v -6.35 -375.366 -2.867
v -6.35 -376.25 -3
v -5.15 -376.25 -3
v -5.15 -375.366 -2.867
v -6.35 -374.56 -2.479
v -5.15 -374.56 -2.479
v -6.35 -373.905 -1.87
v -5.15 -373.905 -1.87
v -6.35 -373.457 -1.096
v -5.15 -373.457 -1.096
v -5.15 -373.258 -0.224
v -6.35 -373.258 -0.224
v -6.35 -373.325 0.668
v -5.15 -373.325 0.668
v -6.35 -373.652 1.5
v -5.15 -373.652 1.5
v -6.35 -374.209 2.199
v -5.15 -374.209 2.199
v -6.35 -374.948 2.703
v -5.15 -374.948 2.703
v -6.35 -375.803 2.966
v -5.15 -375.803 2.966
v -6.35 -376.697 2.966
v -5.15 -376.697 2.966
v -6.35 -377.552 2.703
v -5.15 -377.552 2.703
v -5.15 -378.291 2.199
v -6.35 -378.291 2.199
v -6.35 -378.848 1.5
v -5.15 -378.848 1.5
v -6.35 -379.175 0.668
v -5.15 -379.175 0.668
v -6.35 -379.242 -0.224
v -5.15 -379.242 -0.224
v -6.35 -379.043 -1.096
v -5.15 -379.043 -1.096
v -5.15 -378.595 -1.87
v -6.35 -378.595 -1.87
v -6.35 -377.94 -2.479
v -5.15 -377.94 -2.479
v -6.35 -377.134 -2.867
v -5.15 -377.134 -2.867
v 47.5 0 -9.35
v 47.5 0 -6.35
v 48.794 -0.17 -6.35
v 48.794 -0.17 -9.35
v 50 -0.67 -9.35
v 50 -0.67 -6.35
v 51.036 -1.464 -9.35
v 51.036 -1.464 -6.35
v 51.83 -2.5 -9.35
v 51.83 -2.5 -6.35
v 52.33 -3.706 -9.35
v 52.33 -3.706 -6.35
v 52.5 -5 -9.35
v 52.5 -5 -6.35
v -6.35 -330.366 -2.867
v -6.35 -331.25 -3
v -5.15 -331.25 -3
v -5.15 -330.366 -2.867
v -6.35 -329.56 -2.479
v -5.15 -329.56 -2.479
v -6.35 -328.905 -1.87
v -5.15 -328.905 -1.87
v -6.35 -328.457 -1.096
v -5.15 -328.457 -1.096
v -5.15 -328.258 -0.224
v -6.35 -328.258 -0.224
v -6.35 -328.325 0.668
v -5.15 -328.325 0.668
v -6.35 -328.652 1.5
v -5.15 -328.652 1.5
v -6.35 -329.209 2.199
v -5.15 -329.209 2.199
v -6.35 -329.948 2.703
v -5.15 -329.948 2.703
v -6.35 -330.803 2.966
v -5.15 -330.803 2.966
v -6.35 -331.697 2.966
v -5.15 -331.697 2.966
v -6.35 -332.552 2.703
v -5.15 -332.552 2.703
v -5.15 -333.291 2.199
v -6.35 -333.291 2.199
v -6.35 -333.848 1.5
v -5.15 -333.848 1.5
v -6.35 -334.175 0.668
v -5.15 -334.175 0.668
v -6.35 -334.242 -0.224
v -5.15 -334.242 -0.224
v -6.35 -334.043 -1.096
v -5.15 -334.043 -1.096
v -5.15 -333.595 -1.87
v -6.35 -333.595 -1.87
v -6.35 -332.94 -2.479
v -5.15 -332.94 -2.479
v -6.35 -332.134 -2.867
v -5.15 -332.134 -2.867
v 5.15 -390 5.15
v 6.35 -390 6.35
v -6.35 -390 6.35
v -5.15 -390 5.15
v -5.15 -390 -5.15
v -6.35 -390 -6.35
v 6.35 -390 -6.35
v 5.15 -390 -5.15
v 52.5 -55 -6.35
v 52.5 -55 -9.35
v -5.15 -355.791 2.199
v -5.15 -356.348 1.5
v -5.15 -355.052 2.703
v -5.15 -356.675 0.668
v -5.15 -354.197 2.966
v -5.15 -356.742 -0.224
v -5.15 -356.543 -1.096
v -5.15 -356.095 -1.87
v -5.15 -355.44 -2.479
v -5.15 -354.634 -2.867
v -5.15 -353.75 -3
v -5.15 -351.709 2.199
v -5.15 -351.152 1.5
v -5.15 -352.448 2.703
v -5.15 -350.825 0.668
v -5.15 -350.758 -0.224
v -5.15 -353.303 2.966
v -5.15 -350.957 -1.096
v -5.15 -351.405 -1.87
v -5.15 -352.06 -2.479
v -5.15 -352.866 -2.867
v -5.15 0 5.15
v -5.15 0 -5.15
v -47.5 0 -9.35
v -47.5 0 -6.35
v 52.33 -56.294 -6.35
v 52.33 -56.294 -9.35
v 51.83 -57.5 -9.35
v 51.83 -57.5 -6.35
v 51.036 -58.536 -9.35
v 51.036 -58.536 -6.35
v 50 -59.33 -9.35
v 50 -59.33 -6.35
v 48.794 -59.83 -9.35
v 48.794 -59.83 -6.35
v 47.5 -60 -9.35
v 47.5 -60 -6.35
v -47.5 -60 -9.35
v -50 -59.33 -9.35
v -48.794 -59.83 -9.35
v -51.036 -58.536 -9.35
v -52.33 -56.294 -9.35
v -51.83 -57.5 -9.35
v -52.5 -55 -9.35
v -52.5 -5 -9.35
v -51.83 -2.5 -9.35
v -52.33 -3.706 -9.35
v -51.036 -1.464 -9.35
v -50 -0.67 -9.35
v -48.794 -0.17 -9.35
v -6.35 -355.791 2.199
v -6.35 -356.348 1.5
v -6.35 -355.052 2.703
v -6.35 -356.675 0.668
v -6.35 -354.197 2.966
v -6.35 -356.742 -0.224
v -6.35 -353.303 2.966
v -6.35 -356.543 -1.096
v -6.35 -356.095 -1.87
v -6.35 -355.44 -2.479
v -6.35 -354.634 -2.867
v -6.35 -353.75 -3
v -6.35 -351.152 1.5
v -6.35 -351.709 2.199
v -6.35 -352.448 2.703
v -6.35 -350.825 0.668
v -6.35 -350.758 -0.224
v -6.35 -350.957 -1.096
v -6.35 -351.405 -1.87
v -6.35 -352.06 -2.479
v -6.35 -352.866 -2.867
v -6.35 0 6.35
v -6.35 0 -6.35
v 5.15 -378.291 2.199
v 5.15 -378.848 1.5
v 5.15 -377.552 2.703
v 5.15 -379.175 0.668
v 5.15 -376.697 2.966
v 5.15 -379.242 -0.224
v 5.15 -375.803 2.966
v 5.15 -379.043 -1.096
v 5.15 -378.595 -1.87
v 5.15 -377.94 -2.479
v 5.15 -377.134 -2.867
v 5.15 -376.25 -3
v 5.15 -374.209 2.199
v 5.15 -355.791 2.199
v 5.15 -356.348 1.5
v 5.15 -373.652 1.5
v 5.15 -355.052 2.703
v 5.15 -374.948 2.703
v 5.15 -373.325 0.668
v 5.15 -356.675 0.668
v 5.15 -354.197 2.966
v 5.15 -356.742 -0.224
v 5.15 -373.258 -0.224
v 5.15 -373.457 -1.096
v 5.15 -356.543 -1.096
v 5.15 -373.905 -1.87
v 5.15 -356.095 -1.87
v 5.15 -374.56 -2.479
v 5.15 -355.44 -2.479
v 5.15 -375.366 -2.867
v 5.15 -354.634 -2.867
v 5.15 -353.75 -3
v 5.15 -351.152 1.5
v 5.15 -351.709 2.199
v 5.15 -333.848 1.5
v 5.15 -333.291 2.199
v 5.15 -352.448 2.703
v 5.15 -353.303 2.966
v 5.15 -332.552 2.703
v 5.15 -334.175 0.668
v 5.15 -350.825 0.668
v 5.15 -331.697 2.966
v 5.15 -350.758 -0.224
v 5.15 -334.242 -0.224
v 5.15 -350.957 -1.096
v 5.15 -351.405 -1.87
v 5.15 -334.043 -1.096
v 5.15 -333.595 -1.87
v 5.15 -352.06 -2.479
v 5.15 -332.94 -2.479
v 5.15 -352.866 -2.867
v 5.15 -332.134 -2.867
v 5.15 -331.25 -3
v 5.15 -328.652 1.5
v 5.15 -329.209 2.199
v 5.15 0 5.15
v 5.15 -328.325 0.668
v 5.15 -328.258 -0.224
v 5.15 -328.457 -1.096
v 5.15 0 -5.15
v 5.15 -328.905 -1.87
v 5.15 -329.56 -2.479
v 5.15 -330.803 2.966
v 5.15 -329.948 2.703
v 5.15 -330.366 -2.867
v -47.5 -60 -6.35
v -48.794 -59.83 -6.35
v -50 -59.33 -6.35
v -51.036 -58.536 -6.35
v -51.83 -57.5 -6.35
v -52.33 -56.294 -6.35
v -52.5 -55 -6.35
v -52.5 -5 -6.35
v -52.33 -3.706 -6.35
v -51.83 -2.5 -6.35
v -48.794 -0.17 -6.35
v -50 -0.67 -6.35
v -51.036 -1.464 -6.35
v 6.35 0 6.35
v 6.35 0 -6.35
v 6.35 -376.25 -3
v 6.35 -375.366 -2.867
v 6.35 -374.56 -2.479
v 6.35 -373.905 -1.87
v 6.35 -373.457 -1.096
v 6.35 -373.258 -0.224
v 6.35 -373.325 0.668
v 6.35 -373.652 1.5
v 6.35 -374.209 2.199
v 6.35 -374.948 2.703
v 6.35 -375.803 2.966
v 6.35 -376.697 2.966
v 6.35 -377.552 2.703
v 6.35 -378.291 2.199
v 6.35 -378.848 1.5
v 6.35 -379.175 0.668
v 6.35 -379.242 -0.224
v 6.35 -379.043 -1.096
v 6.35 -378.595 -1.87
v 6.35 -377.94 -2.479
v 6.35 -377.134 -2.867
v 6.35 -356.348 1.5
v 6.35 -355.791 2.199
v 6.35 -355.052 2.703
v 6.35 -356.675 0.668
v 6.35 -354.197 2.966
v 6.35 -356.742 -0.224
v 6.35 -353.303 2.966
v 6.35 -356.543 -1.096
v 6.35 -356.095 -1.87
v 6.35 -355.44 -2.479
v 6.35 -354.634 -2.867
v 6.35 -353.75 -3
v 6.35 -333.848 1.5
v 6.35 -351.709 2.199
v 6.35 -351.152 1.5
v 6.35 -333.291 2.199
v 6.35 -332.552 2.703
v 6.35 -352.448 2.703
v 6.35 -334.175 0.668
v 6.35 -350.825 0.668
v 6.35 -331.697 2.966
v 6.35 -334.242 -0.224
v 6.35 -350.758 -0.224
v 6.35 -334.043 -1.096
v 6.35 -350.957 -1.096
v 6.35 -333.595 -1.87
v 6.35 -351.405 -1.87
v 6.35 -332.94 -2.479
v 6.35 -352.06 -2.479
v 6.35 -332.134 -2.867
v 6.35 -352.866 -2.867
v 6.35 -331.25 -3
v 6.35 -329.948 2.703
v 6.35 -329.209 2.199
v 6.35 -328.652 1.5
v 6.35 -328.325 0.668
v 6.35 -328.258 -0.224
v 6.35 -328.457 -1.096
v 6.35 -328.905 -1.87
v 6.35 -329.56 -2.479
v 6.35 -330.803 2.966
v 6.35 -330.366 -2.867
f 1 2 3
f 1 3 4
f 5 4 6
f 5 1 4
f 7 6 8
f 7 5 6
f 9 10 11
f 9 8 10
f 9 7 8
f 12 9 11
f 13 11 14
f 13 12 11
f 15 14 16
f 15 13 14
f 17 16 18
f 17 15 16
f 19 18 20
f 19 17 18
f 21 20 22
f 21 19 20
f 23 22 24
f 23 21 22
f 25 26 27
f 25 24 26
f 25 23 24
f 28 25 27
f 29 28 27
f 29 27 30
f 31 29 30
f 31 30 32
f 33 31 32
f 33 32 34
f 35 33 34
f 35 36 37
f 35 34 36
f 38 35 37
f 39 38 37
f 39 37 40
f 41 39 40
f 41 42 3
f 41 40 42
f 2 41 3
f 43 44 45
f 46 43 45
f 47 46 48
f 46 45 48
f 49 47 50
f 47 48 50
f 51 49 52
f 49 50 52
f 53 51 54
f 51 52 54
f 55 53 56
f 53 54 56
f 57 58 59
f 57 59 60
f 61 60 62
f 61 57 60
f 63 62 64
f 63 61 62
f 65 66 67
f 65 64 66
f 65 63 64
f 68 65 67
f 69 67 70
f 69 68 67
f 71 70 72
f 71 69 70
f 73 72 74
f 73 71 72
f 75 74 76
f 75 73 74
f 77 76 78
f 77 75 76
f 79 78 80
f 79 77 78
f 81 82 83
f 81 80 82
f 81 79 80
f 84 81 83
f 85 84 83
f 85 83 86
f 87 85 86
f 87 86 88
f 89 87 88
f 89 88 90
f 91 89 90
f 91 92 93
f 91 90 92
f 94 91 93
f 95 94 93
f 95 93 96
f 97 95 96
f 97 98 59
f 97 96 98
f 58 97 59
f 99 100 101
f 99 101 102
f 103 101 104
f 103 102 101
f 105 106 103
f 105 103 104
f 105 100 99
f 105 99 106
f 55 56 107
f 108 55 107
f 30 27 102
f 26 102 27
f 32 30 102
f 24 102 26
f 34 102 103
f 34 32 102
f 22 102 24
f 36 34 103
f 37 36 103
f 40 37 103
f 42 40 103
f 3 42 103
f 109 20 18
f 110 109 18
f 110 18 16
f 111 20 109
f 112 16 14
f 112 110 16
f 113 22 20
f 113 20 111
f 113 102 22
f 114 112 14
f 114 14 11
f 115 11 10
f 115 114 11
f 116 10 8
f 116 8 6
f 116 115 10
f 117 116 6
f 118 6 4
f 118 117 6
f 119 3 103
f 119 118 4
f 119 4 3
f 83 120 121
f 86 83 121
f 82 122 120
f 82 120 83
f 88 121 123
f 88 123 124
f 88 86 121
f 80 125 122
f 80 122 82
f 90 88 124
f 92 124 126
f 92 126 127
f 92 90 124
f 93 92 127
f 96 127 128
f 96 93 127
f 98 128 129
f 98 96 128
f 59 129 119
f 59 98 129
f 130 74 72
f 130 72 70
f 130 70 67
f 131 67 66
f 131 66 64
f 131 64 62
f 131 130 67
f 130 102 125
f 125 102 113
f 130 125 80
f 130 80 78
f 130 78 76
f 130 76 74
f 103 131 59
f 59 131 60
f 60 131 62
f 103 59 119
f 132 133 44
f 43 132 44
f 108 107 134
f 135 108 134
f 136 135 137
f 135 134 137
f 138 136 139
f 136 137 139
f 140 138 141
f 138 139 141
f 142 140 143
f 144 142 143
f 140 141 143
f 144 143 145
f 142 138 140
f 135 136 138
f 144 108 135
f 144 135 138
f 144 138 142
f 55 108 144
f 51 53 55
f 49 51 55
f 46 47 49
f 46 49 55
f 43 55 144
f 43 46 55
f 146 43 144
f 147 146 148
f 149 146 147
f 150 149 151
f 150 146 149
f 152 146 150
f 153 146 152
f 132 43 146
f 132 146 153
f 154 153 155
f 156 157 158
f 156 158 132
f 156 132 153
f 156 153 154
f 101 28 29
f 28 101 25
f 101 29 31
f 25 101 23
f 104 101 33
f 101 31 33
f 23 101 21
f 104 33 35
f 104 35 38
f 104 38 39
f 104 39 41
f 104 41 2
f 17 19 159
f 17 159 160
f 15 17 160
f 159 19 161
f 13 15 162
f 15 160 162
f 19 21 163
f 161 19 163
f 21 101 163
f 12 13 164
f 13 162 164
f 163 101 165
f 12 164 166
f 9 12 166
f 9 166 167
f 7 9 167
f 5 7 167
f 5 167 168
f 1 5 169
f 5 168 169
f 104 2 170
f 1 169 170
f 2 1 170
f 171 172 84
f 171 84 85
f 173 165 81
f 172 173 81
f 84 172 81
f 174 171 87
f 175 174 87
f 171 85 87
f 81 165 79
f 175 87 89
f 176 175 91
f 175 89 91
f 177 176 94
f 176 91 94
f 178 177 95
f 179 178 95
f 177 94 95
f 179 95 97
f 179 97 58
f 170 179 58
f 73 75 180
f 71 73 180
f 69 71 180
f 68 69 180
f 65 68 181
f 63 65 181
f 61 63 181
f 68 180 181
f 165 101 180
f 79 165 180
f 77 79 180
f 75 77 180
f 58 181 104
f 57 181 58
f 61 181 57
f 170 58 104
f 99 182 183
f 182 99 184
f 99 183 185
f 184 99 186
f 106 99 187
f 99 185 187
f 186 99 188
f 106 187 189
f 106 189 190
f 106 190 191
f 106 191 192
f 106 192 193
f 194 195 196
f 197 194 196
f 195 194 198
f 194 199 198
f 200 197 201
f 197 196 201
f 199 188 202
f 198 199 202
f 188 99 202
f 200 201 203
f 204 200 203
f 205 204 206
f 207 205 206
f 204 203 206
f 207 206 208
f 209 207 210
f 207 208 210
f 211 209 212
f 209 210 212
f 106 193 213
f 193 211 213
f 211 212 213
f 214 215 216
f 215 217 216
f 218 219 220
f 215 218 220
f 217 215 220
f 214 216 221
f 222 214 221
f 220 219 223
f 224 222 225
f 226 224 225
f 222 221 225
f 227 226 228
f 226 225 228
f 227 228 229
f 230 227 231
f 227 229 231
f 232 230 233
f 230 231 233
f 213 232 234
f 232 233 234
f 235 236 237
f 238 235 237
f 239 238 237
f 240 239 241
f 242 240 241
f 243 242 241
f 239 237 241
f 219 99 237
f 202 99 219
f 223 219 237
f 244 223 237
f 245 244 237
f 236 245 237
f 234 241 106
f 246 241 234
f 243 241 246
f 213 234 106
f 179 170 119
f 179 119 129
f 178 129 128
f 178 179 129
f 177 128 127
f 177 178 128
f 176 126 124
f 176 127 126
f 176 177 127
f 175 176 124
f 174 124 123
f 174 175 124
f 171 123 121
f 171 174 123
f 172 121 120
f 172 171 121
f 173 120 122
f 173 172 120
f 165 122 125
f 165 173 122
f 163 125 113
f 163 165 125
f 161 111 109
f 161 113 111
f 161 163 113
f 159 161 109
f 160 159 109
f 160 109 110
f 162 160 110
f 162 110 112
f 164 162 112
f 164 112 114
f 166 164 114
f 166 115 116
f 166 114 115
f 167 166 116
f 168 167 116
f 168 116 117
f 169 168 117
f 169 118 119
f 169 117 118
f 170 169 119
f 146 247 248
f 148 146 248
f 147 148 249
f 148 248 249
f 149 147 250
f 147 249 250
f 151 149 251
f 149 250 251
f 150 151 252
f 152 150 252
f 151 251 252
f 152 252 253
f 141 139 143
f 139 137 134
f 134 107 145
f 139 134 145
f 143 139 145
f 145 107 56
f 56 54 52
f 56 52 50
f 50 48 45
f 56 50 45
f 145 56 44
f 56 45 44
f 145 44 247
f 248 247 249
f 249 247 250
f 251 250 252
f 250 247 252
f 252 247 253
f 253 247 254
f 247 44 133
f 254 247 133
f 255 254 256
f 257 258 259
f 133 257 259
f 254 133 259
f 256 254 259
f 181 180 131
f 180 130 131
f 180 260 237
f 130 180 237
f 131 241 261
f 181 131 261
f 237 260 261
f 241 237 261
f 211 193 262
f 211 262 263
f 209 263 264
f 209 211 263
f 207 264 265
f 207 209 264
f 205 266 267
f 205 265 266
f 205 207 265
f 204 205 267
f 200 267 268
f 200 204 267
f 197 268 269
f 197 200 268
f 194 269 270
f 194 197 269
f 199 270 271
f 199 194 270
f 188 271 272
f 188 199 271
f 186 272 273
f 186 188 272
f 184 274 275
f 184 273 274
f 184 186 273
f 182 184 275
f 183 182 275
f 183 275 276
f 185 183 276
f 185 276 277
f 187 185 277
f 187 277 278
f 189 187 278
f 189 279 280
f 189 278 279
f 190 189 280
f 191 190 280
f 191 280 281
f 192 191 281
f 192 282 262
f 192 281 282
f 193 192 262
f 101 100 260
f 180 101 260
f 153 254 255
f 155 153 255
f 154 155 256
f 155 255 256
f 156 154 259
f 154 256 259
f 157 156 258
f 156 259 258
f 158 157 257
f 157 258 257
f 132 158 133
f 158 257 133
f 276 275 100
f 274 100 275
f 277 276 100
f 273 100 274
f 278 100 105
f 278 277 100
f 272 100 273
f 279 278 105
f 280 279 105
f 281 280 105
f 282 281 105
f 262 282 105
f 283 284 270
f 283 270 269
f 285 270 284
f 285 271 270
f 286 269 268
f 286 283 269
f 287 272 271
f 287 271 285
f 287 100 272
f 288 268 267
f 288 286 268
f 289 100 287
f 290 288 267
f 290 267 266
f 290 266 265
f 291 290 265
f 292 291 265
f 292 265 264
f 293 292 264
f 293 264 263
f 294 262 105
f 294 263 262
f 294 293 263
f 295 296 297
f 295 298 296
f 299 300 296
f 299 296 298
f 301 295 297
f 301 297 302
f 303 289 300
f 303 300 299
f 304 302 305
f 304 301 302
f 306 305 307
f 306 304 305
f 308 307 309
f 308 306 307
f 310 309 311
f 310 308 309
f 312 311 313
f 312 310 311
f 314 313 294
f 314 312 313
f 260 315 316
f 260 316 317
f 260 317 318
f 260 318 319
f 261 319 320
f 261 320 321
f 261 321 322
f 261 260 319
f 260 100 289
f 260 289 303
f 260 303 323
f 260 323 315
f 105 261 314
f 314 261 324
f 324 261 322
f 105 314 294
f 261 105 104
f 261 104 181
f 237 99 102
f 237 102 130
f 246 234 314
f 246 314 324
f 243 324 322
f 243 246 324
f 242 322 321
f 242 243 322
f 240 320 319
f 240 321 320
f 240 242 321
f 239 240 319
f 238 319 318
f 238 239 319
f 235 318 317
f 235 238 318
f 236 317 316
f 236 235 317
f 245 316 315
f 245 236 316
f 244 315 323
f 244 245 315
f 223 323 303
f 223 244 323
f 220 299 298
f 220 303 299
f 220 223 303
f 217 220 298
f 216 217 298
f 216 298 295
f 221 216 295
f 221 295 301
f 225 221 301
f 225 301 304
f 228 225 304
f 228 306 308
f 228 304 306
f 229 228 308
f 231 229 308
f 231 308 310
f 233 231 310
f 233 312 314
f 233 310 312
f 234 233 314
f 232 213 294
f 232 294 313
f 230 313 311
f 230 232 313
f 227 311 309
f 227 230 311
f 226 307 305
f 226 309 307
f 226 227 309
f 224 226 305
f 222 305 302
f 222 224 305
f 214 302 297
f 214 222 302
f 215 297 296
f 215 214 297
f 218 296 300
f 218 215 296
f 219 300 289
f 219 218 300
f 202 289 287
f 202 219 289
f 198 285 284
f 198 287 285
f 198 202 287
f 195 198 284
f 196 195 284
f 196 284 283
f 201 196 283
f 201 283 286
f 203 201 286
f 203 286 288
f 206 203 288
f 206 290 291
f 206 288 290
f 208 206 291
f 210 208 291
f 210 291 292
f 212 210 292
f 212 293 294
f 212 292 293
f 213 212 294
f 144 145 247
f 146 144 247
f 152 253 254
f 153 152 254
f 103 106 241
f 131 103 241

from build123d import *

# Parameters (mm, degrees)
SKETCH1_W               = 12.7
SKETCH1_H               = 390
BOSS_EXTRUDE1_DEPTH     = 6.35
SHELL1_T                = -1.2
CUT_EXTRUDE1_DEPTH      = 391.103377325
CUT_EXTRUDE1_DEPTH_BACK = 391.103377325
SKETCH1_3_R             = 3
BOSS_EXTRUDE2_DEPTH     = 3


with BuildPart() as part:
    # Sketch1 → Boss-Extrude1 (new, symmetric)
    with BuildSketch(Plane(origin=(0, 0, 0), x_dir=(0, 0, -1), z_dir=(1, 0, 0))):
        with Locations((0, -195)):
            Rectangle(SKETCH1_W, SKETCH1_H)
    extrude(amount=BOSS_EXTRUDE1_DEPTH, both=True)

    # Shell1
    shell1_openings = [part.faces().sort_by_distance(p)[0] for p in [
        (0, 0, 0),
        (0, -390, 0),
    ]]
    offset(amount=SHELL1_T, openings=shell1_openings, kind=Kind.INTERSECTION)

    # Sketch1<3> → Cut-Extrude1 (cut, two sides: drawn at the far end of the back side and taken through both)
    with BuildSketch(Plane(origin=(0, 0, 0), x_dir=(0, 0, -1), z_dir=(1, 0, 0)).offset(-CUT_EXTRUDE1_DEPTH_BACK)):
        with Locations((0, -376.25)):
            Circle(SKETCH1_3_R)
        with Locations((0, -353.75)):
            Circle(SKETCH1_3_R)
        with Locations((0, -331.25)):
            Circle(SKETCH1_3_R)
    extrude(amount=CUT_EXTRUDE1_DEPTH + CUT_EXTRUDE1_DEPTH_BACK, mode=Mode.SUBTRACT)


with BuildPart() as body_2:
    # Sketch2 → Boss-Extrude2 (new body)
    with BuildSketch(Plane(origin=(0, 0, -6.35), x_dir=(-1, 0, 0), z_dir=(0, 0, -1))):
        with BuildLine():
            Line((-47.5, -60), (47.5, -60))
            ThreePointArc((47.5, -60), (51.035533906, -58.535533906), (52.5, -55))
            Line((52.5, -55), (52.5, -5))
            ThreePointArc((52.5, -5), (51.035533906, -1.464466094), (47.5, 0))
            Line((47.5, 0), (-47.5, 0))
            ThreePointArc((-47.5, 0), (-51.035533906, -1.464466094), (-52.5, -5))
            Line((-52.5, -5), (-52.5, -55))
            ThreePointArc((-52.5, -55), (-51.035533906, -58.535533906), (-47.5, -60))
        make_face()
    extrude(amount=BOSS_EXTRUDE2_DEPTH)


solid = Compound([part.part, body_2.part])
